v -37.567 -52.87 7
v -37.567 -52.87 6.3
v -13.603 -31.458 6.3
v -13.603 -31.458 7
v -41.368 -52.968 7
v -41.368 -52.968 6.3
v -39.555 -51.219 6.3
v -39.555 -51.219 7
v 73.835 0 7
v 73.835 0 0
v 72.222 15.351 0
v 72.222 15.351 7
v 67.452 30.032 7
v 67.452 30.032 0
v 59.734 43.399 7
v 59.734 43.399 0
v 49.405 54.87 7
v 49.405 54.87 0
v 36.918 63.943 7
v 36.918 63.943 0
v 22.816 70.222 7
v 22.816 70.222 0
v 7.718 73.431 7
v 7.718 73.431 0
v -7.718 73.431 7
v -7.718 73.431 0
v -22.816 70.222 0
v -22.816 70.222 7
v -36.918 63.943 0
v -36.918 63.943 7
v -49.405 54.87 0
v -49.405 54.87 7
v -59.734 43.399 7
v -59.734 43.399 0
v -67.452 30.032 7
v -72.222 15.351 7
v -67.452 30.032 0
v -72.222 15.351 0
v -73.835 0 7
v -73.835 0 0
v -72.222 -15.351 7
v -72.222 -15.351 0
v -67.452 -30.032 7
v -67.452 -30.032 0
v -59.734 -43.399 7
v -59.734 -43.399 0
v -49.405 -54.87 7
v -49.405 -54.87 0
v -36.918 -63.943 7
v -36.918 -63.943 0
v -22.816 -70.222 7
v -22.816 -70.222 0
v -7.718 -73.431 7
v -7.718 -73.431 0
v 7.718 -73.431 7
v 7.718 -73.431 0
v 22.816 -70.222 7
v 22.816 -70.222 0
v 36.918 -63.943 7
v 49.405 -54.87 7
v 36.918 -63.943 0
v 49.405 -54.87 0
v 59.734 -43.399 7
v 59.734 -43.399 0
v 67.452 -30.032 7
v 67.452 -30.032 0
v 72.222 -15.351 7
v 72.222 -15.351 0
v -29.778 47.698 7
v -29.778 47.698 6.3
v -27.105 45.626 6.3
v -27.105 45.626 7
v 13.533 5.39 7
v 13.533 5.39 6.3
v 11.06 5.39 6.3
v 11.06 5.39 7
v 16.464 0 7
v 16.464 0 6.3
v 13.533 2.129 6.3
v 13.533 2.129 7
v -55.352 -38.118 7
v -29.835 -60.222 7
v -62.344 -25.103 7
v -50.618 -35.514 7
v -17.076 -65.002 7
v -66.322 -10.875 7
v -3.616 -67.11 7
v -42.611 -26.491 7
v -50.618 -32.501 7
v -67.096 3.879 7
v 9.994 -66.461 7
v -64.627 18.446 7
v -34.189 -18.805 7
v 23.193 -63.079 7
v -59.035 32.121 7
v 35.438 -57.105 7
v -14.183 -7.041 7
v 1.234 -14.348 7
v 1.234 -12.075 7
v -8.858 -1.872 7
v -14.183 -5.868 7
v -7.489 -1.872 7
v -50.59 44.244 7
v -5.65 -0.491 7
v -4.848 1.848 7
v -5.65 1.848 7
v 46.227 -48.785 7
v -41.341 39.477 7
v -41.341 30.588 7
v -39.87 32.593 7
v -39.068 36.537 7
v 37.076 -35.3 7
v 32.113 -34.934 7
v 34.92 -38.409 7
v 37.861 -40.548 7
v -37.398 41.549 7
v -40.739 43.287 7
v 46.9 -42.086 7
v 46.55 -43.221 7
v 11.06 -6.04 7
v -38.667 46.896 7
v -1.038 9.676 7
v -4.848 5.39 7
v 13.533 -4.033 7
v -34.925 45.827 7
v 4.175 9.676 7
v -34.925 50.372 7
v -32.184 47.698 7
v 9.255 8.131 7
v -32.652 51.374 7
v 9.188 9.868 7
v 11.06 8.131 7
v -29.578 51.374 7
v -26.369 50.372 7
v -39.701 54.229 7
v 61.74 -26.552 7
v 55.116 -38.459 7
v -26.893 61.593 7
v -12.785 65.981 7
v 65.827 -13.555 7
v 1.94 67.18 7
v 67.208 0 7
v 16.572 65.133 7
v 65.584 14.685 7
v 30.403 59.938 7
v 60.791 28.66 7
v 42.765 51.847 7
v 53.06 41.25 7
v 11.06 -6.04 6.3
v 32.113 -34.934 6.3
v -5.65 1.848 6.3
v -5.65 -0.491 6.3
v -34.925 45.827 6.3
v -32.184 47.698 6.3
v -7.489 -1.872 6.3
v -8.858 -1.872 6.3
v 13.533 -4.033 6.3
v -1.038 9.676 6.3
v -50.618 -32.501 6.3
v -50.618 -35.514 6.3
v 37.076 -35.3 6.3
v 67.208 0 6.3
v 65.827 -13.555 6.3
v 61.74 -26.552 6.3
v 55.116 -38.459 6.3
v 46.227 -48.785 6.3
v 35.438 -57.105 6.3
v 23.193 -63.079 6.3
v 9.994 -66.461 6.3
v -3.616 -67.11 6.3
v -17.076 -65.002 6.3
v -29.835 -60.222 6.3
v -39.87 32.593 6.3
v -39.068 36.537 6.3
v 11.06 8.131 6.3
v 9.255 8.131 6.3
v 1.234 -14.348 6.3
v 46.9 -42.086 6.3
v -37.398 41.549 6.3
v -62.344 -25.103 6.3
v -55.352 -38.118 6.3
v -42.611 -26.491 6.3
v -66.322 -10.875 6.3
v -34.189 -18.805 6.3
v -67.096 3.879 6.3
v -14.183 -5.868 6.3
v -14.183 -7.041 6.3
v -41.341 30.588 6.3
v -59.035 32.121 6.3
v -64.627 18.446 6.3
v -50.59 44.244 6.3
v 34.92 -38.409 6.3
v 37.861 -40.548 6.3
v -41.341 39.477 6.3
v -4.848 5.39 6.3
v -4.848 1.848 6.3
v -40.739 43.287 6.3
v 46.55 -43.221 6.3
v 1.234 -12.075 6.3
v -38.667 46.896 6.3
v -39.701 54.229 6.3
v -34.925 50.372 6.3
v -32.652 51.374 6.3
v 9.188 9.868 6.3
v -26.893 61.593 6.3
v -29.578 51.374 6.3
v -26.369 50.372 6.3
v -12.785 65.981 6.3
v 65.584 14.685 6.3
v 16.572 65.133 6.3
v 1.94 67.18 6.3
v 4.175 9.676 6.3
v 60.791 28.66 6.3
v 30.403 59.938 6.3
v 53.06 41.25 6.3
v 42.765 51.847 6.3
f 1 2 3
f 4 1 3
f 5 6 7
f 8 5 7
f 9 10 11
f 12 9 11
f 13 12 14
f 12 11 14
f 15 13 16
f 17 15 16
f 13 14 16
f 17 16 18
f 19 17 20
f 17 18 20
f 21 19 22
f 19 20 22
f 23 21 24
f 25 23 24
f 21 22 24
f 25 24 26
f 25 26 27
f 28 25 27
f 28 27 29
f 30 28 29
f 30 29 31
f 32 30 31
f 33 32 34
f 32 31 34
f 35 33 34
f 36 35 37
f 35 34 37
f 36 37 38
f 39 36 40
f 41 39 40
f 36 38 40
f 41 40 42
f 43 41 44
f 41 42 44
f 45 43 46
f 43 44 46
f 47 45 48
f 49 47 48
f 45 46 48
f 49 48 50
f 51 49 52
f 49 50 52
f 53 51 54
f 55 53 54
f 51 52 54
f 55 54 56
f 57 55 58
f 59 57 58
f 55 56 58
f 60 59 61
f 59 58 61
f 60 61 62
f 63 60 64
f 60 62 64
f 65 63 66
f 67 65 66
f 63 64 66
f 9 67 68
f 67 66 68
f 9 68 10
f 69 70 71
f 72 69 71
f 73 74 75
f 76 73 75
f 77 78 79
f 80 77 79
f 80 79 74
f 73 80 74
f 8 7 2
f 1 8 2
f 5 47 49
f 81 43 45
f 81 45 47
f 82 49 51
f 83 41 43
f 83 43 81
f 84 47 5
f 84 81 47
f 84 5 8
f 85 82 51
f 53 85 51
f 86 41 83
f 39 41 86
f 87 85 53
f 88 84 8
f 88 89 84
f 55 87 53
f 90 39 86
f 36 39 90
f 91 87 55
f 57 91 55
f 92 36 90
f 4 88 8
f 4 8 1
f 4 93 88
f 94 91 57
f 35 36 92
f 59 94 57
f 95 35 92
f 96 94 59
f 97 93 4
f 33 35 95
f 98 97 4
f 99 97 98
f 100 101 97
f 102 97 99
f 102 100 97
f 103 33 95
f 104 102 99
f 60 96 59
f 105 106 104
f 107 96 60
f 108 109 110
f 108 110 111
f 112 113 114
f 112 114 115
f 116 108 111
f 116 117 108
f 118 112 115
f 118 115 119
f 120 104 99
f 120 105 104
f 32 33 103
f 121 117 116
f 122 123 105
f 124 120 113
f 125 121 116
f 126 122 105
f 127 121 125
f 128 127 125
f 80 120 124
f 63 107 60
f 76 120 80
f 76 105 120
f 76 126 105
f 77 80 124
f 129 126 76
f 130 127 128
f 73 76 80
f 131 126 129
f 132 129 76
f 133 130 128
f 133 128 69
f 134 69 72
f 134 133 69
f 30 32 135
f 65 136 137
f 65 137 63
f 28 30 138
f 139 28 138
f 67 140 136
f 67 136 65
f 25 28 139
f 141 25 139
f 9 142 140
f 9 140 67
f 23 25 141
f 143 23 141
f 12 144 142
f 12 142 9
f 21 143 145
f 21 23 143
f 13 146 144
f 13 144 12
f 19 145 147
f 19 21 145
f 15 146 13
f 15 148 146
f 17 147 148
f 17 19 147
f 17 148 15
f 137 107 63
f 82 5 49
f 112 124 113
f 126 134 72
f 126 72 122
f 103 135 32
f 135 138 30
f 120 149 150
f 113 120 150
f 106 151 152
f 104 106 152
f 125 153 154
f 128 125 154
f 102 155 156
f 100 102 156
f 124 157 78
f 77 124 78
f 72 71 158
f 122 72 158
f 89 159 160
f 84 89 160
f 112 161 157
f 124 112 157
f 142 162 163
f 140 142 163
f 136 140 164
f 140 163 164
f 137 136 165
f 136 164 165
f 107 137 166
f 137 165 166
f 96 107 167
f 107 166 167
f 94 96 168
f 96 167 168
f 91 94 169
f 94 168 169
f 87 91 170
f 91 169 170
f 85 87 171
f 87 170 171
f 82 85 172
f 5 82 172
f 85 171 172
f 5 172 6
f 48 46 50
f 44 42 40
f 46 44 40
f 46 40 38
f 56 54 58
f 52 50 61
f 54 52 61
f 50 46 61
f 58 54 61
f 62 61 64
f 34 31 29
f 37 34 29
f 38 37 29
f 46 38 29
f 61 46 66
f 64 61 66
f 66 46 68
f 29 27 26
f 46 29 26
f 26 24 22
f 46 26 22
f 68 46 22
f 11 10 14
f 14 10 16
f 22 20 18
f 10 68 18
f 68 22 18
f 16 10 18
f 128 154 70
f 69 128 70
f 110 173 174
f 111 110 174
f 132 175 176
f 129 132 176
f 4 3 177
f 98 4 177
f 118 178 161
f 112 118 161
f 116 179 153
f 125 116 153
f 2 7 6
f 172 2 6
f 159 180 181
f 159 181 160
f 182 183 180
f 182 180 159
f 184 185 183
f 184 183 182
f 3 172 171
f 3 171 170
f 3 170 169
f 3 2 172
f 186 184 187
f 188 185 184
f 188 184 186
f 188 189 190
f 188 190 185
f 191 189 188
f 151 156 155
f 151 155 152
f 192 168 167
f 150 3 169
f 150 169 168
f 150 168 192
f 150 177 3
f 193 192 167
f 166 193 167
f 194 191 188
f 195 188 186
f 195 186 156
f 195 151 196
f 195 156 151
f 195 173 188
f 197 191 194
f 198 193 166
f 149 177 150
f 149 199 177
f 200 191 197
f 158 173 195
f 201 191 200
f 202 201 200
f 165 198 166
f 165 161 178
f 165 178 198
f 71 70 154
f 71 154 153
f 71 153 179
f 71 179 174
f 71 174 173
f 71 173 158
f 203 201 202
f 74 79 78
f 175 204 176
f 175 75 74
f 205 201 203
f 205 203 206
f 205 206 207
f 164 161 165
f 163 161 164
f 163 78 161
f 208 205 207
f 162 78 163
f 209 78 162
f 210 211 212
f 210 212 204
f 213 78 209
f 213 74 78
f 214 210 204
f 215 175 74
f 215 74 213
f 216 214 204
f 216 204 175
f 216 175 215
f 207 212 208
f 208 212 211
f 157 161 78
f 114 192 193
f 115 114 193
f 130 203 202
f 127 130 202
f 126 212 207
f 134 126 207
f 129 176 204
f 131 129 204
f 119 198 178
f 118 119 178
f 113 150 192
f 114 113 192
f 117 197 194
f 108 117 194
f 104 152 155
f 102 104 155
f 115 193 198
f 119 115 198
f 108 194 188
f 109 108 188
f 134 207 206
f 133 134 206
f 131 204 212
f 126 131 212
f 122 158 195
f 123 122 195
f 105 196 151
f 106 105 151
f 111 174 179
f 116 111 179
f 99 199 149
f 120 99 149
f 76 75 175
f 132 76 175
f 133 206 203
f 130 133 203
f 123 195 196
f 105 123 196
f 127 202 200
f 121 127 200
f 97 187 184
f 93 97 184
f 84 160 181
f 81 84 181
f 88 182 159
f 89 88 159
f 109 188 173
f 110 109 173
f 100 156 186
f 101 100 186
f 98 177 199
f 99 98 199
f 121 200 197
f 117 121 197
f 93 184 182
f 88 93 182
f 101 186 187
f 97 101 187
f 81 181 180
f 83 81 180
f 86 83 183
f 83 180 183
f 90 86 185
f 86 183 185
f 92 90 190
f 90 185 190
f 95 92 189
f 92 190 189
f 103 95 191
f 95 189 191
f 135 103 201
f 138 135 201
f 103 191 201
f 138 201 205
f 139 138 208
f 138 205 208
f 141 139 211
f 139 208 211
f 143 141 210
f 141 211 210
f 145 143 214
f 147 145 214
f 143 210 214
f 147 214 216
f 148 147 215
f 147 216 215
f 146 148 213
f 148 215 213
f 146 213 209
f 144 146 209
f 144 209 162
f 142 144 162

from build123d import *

# Parameters (mm, degrees)
F0_R     = 73.835319
F1_DEPTH = 7
F2_DEPTH = 6.3


with BuildPart() as f1:
    # F0 (on Top) → F1 (new body)
    with BuildSketch(Plane.XY):
        Circle(F0_R)
        with BuildLine():
            ThreePointArc((-55.352281, -38.118447), (-19.959771, 64.175529), (67.20782, 0))
            ThreePointArc((67.20782, 0), (29.467148, -60.403462), (-41.368183, -52.967579))
            ThreePointArc((-41.368183, -52.967579), (-48.926845, -46.076619), (-55.352281, -38.118447))
        make_face(mode=Mode.SUBTRACT)
        with BuildLine():
            Line((-50.618433, -35.51409), (-55.352281, -38.118447))
            ThreePointArc((-55.352281, -38.118447), (-48.926845, -46.076619), (-41.368183, -52.967579))
            Line((-41.368183, -52.967579), (-39.555106, -51.21921))
            Line((-39.555106, -51.21921), (-37.567016, -52.8697))
            Line((-37.567016, -52.8697), (-13.603393, -31.458031))
            Line((-13.603393, -31.458031), (1.234484, -14.347686))
            Line((1.234484, -14.347686), (1.234484, -12.075218))
            Line((1.234484, -12.075218), (11.05952, -6.03984))
            Line((11.05952, -6.03984), (32.11331, -34.933571))
            Line((32.11331, -34.933571), (34.920476, -38.40911))
            Line((34.920476, -38.40911), (37.861317, -40.547904))
            Line((37.861317, -40.547904), (46.550162, -43.221395))
            Line((46.550162, -43.221395), (46.899657, -42.085539))
            Line((46.899657, -42.085539), (37.076384, -35.29954))
            Line((37.076384, -35.29954), (13.533317, -4.032719))
            Line((13.533317, -4.032719), (16.463503, 0))
            Line((16.463503, 0), (13.533317, 2.129083))
            Line((13.533317, 2.129083), (13.533317, 5.39033))
            Line((13.533317, 5.39033), (11.05952, 5.39033))
            Line((11.05952, 5.39033), (11.05952, 8.130658))
            Line((11.05952, 8.130658), (9.254914, 8.130658))
            Line((9.254914, 8.130658), (9.188076, 9.868428))
            Line((9.188076, 9.868428), (4.174984, 9.675617))
            Line((4.174984, 9.675617), (-26.369359, 50.371822))
            Line((-26.369359, 50.371822), (-29.577548, 51.374383))
            Line((-29.577548, 51.374383), (-32.652061, 51.374383))
            Line((-32.652061, 51.374383), (-34.924529, 50.371822))
            Line((-34.924529, 50.371822), (-38.667418, 46.896283))
            Line((-38.667418, 46.896283), (-40.739372, 43.287069))
            Line((-40.739372, 43.287069), (-41.34091, 39.477345))
            Line((-41.34091, 39.477345), (-41.34091, 30.587986))
            Line((-41.34091, 30.587986), (-39.870489, 32.593105))
            Line((-39.870489, 32.593105), (-39.068446, 36.536504))
            Line((-39.068446, 36.536504), (-37.397511, 41.549303))
            Line((-37.397511, 41.549303), (-34.924529, 45.826886))
            Line((-34.924529, 45.826886), (-32.184202, 47.69833))
            Line((-32.184202, 47.69833), (-29.77806, 47.69833))
            Line((-29.77806, 47.69833), (-27.10457, 45.626376))
            Line((-27.10457, 45.626376), (-1.038028, 9.675617))
            Line((-1.038028, 9.675617), (-4.847753, 5.39033))
            Line((-4.847753, 5.39033), (-4.847753, 1.847953))
            Line((-4.847753, 1.847953), (-5.6498, 1.847953))
            Line((-5.6498, 1.847953), (-5.6498, -0.491352))
            Line((-5.6498, -0.491352), (-7.488666, -1.871504))
            Line((-7.488666, -1.871504), (-8.85799, -1.871504))
            Line((-8.85799, -1.871504), (-14.18264, -5.867895))
            Line((-14.18264, -5.867895), (-14.18264, -7.041406))
            Line((-14.18264, -7.041406), (-34.189317, -18.804768))
            Line((-34.189317, -18.804768), (-42.610817, -26.491057))
            Line((-42.610817, -26.491057), (-50.618433, -32.501136))
            Line((-50.618433, -32.501136), (-50.618433, -35.51409))
        make_face()
    extrude(amount=F1_DEPTH)

    # F0 (on Top) → F2 (join)
    with BuildSketch(Plane.XY):
        with BuildLine():
            ThreePointArc((-41.368183, -52.967579), (29.467148, -60.403462), (67.20782, 0))
            ThreePointArc((67.20782, 0), (-19.959771, 64.175529), (-55.352281, -38.118447))
            Line((-55.352281, -38.118447), (-50.618433, -35.51409))
            Line((-50.618433, -35.51409), (-50.618433, -32.501136))
            Line((-50.618433, -32.501136), (-42.610817, -26.491057))
            Line((-42.610817, -26.491057), (-34.189317, -18.804768))
            Line((-34.189317, -18.804768), (-14.18264, -7.041406))
            Line((-14.18264, -7.041406), (-14.18264, -5.867895))
            Line((-14.18264, -5.867895), (-8.85799, -1.871504))
            Line((-8.85799, -1.871504), (-7.488666, -1.871504))
            Line((-7.488666, -1.871504), (-5.6498, -0.491352))
            Line((-5.6498, -0.491352), (-5.6498, 1.847953))
            Line((-5.6498, 1.847953), (-4.847753, 1.847953))
            Line((-4.847753, 1.847953), (-4.847753, 5.39033))
            Line((-4.847753, 5.39033), (-1.038028, 9.675617))
            Line((-1.038028, 9.675617), (-27.10457, 45.626376))
            Line((-27.10457, 45.626376), (-29.77806, 47.69833))
            Line((-29.77806, 47.69833), (-32.184202, 47.69833))
            Line((-32.184202, 47.69833), (-34.924529, 45.826886))
            Line((-34.924529, 45.826886), (-37.397511, 41.549303))
            Line((-37.397511, 41.549303), (-39.068446, 36.536504))
            Line((-39.068446, 36.536504), (-39.870489, 32.593105))
            Line((-39.870489, 32.593105), (-41.34091, 30.587986))
            Line((-41.34091, 30.587986), (-41.34091, 39.477345))
            Line((-41.34091, 39.477345), (-40.739372, 43.287069))
            Line((-40.739372, 43.287069), (-38.667418, 46.896283))
            Line((-38.667418, 46.896283), (-34.924529, 50.371822))
            Line((-34.924529, 50.371822), (-32.652061, 51.374383))
            Line((-32.652061, 51.374383), (-29.577548, 51.374383))
            Line((-29.577548, 51.374383), (-26.369359, 50.371822))
            Line((-26.369359, 50.371822), (4.174984, 9.675617))
            Line((4.174984, 9.675617), (9.188076, 9.868428))
            Line((9.188076, 9.868428), (9.254914, 8.130658))
            Line((9.254914, 8.130658), (11.05952, 8.130658))
            Line((11.05952, 8.130658), (11.05952, 5.39033))
            Line((11.05952, 5.39033), (13.533317, 5.39033))
            Line((13.533317, 5.39033), (13.533317, 2.129083))
            Line((13.533317, 2.129083), (16.463503, 0))
            Line((16.463503, 0), (13.533317, -4.032719))
            Line((13.533317, -4.032719), (37.076384, -35.29954))
            Line((37.076384, -35.29954), (46.899657, -42.085539))
            Line((46.899657, -42.085539), (46.550162, -43.221395))
            Line((46.550162, -43.221395), (37.861317, -40.547904))
            Line((37.861317, -40.547904), (34.920476, -38.40911))
            Line((34.920476, -38.40911), (32.11331, -34.933571))
            Line((32.11331, -34.933571), (11.05952, -6.03984))
            Line((11.05952, -6.03984), (1.234484, -12.075218))
            Line((1.234484, -12.075218), (1.234484, -14.347686))
            Line((1.234484, -14.347686), (-13.603393, -31.458031))
            Line((-13.603393, -31.458031), (-37.567016, -52.8697))
            Line((-37.567016, -52.8697), (-39.555106, -51.21921))
            Line((-39.555106, -51.21921), (-41.368183, -52.967579))
        make_face()
    extrude(amount=F2_DEPTH)


solid = f1.part
